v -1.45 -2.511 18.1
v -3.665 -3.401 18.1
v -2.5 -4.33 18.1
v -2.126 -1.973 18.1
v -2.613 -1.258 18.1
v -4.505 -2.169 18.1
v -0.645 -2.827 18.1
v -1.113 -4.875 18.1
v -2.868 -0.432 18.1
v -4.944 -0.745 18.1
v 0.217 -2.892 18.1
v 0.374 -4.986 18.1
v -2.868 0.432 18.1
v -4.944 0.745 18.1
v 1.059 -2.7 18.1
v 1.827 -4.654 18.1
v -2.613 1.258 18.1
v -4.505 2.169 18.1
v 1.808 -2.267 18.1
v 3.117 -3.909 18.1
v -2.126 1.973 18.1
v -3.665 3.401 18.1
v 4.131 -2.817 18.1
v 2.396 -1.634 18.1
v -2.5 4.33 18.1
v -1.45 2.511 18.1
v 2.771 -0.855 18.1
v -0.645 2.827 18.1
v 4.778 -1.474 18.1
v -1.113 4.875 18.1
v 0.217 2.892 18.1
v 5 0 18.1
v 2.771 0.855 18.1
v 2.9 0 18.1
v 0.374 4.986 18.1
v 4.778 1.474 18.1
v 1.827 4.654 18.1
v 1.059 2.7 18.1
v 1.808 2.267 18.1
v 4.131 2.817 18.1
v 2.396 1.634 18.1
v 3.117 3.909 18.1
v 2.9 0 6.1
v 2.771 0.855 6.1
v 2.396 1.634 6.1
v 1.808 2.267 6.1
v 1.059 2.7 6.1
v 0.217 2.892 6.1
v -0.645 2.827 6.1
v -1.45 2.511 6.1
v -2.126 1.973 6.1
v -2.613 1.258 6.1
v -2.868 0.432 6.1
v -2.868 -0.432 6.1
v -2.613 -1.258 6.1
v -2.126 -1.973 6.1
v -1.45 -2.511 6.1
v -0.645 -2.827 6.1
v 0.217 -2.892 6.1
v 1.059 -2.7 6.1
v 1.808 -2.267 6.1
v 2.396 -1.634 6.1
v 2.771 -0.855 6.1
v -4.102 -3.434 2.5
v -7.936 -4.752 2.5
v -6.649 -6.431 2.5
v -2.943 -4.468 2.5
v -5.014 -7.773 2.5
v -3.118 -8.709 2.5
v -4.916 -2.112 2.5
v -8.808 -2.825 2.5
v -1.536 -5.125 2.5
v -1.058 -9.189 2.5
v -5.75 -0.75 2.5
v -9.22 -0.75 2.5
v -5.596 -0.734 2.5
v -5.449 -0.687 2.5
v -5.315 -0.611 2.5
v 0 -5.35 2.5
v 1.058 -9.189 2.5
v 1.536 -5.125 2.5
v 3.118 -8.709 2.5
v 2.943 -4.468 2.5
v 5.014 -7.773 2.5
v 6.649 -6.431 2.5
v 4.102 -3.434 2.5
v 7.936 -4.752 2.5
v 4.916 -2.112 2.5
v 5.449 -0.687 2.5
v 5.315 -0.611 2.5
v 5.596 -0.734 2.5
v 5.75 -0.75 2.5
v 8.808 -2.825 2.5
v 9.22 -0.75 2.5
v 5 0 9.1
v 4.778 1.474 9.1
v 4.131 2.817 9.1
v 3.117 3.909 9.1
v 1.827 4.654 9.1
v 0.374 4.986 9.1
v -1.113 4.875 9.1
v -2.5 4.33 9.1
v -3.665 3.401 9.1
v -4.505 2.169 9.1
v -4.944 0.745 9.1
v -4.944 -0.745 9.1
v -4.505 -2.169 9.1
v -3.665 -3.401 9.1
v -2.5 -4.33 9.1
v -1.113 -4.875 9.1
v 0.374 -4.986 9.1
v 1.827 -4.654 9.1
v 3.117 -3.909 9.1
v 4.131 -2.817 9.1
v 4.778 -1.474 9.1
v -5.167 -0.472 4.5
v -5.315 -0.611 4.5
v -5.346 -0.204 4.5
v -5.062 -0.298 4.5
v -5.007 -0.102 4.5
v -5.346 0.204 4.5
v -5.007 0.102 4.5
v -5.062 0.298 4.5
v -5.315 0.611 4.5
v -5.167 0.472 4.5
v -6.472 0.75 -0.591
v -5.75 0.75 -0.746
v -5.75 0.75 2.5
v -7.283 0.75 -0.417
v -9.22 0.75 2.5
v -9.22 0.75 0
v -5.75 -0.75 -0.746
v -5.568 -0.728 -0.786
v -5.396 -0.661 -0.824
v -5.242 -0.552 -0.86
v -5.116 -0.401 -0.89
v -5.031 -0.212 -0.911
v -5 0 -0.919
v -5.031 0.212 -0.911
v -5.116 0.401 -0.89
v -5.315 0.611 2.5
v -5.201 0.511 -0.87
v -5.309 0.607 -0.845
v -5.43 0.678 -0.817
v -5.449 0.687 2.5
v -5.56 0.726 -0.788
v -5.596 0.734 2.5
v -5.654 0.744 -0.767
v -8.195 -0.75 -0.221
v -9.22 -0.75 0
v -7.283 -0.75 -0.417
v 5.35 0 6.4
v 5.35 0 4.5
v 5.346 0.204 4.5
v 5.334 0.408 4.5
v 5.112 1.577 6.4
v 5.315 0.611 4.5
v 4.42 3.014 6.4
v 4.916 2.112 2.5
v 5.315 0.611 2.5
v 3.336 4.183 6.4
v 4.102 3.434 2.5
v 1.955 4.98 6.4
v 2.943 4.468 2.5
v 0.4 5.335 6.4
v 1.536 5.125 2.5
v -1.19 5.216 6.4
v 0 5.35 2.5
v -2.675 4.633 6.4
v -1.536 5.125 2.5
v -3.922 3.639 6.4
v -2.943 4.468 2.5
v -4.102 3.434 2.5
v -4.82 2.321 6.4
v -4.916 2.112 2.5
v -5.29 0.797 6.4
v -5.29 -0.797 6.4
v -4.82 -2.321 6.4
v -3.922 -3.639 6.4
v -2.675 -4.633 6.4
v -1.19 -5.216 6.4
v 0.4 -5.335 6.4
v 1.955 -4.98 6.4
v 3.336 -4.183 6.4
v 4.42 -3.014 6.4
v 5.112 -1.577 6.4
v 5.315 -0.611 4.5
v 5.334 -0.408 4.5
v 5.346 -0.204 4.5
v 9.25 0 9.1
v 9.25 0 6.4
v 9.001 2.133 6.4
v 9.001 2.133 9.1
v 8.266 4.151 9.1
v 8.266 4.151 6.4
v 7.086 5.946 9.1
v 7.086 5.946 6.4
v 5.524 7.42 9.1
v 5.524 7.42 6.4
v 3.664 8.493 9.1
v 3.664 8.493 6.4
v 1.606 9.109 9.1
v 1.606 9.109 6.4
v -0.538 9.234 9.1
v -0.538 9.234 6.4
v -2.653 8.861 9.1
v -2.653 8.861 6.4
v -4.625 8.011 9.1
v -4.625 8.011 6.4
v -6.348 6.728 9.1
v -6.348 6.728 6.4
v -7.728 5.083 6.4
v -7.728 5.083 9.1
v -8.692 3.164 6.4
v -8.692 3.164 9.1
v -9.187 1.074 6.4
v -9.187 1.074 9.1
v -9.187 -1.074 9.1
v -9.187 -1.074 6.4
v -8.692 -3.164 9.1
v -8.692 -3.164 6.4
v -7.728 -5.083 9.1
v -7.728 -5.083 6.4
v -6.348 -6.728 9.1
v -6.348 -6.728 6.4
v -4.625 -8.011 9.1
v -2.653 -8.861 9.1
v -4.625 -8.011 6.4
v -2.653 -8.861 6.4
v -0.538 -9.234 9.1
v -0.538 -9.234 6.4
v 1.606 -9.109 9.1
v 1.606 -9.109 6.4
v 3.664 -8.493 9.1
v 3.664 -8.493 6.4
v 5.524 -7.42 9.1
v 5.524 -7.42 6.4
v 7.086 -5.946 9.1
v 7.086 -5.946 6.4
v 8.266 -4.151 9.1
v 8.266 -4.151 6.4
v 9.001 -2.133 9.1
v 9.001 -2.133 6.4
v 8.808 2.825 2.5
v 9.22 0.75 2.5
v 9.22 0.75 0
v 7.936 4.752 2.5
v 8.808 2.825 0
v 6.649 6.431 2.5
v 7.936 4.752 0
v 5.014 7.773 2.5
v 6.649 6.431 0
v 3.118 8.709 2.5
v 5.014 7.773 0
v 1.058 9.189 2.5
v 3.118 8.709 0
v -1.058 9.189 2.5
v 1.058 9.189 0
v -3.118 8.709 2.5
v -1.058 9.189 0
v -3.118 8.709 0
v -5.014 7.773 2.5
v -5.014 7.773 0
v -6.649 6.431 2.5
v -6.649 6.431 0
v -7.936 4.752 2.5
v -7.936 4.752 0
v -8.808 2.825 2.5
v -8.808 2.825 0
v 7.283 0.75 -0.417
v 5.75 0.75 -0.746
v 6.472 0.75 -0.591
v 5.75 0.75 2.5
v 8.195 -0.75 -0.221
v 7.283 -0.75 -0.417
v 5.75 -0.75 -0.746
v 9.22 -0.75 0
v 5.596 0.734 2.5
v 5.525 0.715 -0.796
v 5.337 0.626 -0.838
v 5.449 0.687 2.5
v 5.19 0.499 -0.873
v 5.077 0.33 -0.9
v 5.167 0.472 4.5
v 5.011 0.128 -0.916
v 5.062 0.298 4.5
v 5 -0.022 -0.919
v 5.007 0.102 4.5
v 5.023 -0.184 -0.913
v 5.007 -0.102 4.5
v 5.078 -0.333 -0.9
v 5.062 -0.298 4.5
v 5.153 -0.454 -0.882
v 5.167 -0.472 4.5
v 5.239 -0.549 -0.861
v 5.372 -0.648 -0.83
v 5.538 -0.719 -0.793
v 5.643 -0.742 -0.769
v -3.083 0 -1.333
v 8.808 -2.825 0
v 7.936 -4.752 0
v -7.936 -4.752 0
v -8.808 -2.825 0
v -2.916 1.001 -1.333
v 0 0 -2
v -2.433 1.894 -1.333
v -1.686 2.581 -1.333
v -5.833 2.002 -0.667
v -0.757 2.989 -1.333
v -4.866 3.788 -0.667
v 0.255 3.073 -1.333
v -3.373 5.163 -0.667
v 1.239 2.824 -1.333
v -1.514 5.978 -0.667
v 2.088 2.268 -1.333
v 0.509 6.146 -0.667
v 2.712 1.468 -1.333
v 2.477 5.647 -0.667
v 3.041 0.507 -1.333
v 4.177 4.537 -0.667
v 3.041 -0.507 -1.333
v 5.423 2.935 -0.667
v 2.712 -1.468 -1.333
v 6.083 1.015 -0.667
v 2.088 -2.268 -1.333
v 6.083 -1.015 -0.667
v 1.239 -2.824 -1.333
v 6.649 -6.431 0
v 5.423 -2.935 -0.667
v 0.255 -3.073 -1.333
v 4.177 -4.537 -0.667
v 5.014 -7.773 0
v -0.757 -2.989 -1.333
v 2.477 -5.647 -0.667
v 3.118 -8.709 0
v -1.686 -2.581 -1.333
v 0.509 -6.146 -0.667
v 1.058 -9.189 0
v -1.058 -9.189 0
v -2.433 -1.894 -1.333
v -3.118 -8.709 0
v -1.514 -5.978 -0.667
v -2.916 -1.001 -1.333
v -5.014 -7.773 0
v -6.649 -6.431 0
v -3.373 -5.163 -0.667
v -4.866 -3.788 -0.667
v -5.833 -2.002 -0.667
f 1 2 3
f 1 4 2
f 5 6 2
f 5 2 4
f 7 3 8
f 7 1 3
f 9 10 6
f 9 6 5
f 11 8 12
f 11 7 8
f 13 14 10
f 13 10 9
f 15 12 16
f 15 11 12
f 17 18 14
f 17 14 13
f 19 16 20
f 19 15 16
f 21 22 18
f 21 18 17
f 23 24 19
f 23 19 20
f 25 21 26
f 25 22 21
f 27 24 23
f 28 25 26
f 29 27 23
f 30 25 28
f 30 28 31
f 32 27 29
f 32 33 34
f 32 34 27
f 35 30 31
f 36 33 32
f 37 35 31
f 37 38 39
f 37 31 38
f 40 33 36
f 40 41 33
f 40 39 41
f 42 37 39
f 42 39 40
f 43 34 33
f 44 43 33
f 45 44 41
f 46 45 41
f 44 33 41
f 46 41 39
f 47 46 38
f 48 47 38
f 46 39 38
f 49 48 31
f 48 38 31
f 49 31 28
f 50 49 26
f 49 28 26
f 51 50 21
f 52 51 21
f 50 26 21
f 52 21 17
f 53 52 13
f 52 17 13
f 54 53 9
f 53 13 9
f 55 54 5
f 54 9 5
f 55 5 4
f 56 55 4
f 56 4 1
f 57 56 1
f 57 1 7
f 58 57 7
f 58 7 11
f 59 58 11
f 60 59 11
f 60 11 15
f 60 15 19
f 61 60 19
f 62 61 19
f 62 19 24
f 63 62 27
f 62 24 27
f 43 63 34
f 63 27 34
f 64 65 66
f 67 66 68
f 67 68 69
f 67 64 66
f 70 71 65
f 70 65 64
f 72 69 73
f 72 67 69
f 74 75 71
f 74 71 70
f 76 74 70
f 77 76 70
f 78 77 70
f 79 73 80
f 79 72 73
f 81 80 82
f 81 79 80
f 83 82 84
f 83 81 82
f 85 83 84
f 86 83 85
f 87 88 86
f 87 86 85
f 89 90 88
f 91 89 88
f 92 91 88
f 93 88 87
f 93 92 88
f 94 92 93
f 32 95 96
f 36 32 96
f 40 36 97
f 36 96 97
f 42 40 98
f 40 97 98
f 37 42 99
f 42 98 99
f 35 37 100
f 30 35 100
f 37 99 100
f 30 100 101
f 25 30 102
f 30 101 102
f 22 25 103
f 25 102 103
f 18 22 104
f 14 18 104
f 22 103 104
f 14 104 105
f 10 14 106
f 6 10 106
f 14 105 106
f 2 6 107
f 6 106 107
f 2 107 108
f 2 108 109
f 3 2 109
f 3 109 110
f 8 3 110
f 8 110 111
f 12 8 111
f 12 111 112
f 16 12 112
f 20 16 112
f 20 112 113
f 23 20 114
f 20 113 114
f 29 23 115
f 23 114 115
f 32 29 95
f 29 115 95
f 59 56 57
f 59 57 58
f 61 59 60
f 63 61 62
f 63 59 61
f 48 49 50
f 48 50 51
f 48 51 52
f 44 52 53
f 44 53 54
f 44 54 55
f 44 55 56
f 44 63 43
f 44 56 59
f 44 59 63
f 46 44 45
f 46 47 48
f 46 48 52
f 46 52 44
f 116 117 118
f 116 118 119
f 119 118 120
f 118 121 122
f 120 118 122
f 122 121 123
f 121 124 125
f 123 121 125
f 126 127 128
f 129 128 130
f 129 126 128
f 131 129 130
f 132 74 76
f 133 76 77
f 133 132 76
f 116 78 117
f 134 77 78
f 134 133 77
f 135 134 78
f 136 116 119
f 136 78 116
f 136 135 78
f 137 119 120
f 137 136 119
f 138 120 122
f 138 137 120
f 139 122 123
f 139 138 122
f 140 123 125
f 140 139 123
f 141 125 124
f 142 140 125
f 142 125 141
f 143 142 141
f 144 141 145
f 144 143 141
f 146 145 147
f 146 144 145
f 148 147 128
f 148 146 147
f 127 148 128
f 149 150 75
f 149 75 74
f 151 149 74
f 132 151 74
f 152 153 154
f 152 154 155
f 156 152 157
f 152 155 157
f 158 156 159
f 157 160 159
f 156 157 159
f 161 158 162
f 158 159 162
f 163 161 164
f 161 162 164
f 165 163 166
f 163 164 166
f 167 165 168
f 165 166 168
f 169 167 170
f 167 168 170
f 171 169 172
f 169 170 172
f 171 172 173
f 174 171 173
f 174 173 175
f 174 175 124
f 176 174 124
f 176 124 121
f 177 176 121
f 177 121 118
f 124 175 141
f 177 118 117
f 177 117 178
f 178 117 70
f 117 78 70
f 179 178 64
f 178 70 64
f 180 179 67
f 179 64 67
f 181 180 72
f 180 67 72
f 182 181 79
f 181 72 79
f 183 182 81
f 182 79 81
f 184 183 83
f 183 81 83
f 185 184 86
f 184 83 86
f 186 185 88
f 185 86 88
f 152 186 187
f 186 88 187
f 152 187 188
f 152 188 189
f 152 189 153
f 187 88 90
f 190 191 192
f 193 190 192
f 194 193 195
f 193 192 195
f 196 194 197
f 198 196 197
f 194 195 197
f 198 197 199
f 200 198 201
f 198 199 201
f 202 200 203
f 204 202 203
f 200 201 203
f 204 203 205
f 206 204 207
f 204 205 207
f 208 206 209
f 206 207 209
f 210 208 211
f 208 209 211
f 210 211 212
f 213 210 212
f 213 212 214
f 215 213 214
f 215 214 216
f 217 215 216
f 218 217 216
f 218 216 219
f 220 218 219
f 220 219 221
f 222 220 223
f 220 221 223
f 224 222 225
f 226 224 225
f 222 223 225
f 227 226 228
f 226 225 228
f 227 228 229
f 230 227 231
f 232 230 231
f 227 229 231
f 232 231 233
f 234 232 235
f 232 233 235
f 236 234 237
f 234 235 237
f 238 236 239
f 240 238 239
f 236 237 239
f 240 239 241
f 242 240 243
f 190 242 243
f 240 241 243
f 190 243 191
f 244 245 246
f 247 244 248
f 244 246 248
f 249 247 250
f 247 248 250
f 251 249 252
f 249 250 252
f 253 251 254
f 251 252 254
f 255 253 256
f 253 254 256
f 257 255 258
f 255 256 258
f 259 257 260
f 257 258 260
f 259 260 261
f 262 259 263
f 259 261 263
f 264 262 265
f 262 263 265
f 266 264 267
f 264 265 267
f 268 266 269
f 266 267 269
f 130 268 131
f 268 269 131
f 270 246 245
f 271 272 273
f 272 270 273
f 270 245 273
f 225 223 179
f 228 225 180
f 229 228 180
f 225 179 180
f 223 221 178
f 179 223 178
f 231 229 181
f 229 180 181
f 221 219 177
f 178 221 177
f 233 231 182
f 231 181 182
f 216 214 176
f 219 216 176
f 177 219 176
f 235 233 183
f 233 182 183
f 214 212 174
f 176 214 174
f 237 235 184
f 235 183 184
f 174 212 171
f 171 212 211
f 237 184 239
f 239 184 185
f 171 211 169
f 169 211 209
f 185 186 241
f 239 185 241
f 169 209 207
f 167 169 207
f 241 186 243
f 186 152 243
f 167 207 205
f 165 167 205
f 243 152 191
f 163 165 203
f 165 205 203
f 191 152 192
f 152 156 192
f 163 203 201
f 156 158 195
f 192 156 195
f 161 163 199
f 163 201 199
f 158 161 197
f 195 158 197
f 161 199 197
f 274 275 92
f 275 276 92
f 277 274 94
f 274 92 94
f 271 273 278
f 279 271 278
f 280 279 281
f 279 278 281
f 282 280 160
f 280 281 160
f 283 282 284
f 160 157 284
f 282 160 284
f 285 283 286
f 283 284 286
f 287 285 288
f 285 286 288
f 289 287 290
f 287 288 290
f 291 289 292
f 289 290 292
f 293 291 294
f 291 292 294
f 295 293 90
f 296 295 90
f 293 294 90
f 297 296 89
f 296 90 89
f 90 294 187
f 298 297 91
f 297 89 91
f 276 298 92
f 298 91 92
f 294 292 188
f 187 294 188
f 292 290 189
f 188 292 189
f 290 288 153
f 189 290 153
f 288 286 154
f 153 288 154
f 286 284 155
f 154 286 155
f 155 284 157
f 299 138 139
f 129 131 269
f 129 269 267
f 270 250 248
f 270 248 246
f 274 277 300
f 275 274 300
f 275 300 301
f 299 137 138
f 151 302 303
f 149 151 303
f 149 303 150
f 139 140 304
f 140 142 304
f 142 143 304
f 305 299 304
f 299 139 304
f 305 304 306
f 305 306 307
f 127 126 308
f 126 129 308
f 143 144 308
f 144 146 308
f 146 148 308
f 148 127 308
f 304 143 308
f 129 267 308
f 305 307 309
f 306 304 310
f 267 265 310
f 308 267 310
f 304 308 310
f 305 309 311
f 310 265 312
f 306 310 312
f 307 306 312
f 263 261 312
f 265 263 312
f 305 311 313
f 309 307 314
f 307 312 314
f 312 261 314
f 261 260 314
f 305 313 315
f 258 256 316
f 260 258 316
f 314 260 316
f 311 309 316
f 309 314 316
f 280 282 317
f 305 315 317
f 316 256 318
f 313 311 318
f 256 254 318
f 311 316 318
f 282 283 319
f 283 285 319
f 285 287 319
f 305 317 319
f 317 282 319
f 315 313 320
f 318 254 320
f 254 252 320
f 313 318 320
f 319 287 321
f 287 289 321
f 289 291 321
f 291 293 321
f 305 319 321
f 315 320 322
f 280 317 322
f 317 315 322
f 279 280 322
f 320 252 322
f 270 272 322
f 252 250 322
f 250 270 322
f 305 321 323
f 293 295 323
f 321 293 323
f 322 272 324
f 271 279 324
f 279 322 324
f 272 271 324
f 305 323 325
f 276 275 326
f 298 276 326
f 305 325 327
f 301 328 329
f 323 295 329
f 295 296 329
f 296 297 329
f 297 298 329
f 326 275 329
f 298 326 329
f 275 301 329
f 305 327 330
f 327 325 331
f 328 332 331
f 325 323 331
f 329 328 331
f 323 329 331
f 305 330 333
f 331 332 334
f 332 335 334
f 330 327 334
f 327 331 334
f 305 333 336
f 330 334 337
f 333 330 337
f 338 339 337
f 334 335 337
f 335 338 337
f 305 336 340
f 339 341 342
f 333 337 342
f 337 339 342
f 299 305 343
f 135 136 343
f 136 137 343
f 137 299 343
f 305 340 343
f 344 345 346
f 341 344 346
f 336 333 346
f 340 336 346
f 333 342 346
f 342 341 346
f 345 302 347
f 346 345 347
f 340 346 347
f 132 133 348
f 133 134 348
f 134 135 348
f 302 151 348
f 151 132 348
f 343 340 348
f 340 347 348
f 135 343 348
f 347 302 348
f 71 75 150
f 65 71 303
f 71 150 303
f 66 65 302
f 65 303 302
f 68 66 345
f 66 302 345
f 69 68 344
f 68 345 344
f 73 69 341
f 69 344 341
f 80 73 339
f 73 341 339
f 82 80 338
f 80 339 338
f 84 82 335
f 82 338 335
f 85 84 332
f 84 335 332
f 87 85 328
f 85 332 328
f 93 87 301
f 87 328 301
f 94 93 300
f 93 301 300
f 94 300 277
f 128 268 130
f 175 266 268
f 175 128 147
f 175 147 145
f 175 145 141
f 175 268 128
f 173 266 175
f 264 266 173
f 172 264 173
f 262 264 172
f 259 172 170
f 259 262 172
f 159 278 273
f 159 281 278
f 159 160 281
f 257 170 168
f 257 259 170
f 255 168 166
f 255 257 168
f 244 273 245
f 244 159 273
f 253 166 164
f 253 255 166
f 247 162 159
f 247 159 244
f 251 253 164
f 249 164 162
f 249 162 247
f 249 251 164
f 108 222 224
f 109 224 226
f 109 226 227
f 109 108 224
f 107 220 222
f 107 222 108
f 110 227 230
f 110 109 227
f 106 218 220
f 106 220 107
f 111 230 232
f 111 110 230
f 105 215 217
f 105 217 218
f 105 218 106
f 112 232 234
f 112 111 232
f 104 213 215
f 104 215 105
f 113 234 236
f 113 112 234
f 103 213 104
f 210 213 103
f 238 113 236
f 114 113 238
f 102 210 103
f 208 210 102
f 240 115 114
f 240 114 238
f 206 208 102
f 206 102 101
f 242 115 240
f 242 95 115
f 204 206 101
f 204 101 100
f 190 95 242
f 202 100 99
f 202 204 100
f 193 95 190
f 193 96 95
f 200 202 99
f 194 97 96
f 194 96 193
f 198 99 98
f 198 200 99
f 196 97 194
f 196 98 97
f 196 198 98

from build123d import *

# Parameters (mm, degrees)
SKETCH1_R           = 9.25
BOSS_EXTRUDE1_DEPTH = 2.5
SKETCH2_R           = 5.35
BOSS_EXTRUDE2_DEPTH = 3.9
SKETCH3_R           = 9.25
BOSS_EXTRUDE3_DEPTH = 2.7
SKETCH4_R           = 5
BOSS_EXTRUDE4_DEPTH = 9
CUT_EXTRUDE1_DEPTH  = 4.5
SKETCH8_R           = 2.9
CUT_EXTRUDE2_DEPTH  = 12


with BuildPart() as part:
    # Sketch1 → Boss-Extrude1 (new body)
    with BuildSketch(Plane.XY):
        Circle(SKETCH1_R)
    extrude(amount=BOSS_EXTRUDE1_DEPTH)

    # Sketch2 → Boss-Extrude2 (add)
    with BuildSketch(Plane.XY.offset(2.5)):
        Circle(SKETCH2_R)
    extrude(amount=BOSS_EXTRUDE2_DEPTH)

    # Sketch3 → Boss-Extrude3 (add)
    with BuildSketch(Plane.XY.offset(6.4)):
        Circle(SKETCH3_R)
    extrude(amount=BOSS_EXTRUDE3_DEPTH)

    # Sketch4 → Boss-Extrude4 (add)
    with BuildSketch(Plane.XY.offset(9.1)):
        Circle(SKETCH4_R)
    extrude(amount=BOSS_EXTRUDE4_DEPTH)

    # Sketch6 → Revolve1 (revolve)
    with BuildSketch(Plane(origin=(0, 0, 0), x_dir=(1, 0, 0), z_dir=(0, 1, 0)), mode=Mode.PRIVATE) as revolve1_sk:
        Polygon((0, 0), (0, 2), (9.25, 0), align=None)
    revolve(revolve1_sk.sketch.rotate(Axis((0, 0, 0), (0, 0, -1)), 180), axis=Axis((0, 0, 0), (0, 0, -1)))

    # Sketch7 → Cut-Extrude1 (cut, symmetric)
    with BuildSketch(Plane.XY):
        with BuildLine():
            Line((-5.75, 0.75), (-9.219544457, 0.75))
            ThreePointArc((-9.219544457, 0.75), (-9.25, 0), (-9.219544457, -0.75))
            Line((-9.219544457, -0.75), (-5.75, -0.75))
            ThreePointArc((-5.75, -0.75), (-5, 0), (-5.75, 0.75))
        make_face()
        with BuildLine():
            Line((5.75, -0.75), (9.219544457, -0.75))
            ThreePointArc((9.219544457, -0.75), (9.25, 0), (9.219544457, 0.75))
            Line((9.219544457, 0.75), (5.75, 0.75))
            ThreePointArc((5.75, 0.75), (5, 0), (5.75, -0.75))
        make_face()
    extrude(amount=CUT_EXTRUDE1_DEPTH, both=True, mode=Mode.SUBTRACT)

    # Sketch8 → Cut-Extrude2 (cut)
    with BuildSketch(Plane.XY.offset(18.1)):
        Circle(SKETCH8_R)
    extrude(amount=-CUT_EXTRUDE2_DEPTH, mode=Mode.SUBTRACT)


solid = part.part
